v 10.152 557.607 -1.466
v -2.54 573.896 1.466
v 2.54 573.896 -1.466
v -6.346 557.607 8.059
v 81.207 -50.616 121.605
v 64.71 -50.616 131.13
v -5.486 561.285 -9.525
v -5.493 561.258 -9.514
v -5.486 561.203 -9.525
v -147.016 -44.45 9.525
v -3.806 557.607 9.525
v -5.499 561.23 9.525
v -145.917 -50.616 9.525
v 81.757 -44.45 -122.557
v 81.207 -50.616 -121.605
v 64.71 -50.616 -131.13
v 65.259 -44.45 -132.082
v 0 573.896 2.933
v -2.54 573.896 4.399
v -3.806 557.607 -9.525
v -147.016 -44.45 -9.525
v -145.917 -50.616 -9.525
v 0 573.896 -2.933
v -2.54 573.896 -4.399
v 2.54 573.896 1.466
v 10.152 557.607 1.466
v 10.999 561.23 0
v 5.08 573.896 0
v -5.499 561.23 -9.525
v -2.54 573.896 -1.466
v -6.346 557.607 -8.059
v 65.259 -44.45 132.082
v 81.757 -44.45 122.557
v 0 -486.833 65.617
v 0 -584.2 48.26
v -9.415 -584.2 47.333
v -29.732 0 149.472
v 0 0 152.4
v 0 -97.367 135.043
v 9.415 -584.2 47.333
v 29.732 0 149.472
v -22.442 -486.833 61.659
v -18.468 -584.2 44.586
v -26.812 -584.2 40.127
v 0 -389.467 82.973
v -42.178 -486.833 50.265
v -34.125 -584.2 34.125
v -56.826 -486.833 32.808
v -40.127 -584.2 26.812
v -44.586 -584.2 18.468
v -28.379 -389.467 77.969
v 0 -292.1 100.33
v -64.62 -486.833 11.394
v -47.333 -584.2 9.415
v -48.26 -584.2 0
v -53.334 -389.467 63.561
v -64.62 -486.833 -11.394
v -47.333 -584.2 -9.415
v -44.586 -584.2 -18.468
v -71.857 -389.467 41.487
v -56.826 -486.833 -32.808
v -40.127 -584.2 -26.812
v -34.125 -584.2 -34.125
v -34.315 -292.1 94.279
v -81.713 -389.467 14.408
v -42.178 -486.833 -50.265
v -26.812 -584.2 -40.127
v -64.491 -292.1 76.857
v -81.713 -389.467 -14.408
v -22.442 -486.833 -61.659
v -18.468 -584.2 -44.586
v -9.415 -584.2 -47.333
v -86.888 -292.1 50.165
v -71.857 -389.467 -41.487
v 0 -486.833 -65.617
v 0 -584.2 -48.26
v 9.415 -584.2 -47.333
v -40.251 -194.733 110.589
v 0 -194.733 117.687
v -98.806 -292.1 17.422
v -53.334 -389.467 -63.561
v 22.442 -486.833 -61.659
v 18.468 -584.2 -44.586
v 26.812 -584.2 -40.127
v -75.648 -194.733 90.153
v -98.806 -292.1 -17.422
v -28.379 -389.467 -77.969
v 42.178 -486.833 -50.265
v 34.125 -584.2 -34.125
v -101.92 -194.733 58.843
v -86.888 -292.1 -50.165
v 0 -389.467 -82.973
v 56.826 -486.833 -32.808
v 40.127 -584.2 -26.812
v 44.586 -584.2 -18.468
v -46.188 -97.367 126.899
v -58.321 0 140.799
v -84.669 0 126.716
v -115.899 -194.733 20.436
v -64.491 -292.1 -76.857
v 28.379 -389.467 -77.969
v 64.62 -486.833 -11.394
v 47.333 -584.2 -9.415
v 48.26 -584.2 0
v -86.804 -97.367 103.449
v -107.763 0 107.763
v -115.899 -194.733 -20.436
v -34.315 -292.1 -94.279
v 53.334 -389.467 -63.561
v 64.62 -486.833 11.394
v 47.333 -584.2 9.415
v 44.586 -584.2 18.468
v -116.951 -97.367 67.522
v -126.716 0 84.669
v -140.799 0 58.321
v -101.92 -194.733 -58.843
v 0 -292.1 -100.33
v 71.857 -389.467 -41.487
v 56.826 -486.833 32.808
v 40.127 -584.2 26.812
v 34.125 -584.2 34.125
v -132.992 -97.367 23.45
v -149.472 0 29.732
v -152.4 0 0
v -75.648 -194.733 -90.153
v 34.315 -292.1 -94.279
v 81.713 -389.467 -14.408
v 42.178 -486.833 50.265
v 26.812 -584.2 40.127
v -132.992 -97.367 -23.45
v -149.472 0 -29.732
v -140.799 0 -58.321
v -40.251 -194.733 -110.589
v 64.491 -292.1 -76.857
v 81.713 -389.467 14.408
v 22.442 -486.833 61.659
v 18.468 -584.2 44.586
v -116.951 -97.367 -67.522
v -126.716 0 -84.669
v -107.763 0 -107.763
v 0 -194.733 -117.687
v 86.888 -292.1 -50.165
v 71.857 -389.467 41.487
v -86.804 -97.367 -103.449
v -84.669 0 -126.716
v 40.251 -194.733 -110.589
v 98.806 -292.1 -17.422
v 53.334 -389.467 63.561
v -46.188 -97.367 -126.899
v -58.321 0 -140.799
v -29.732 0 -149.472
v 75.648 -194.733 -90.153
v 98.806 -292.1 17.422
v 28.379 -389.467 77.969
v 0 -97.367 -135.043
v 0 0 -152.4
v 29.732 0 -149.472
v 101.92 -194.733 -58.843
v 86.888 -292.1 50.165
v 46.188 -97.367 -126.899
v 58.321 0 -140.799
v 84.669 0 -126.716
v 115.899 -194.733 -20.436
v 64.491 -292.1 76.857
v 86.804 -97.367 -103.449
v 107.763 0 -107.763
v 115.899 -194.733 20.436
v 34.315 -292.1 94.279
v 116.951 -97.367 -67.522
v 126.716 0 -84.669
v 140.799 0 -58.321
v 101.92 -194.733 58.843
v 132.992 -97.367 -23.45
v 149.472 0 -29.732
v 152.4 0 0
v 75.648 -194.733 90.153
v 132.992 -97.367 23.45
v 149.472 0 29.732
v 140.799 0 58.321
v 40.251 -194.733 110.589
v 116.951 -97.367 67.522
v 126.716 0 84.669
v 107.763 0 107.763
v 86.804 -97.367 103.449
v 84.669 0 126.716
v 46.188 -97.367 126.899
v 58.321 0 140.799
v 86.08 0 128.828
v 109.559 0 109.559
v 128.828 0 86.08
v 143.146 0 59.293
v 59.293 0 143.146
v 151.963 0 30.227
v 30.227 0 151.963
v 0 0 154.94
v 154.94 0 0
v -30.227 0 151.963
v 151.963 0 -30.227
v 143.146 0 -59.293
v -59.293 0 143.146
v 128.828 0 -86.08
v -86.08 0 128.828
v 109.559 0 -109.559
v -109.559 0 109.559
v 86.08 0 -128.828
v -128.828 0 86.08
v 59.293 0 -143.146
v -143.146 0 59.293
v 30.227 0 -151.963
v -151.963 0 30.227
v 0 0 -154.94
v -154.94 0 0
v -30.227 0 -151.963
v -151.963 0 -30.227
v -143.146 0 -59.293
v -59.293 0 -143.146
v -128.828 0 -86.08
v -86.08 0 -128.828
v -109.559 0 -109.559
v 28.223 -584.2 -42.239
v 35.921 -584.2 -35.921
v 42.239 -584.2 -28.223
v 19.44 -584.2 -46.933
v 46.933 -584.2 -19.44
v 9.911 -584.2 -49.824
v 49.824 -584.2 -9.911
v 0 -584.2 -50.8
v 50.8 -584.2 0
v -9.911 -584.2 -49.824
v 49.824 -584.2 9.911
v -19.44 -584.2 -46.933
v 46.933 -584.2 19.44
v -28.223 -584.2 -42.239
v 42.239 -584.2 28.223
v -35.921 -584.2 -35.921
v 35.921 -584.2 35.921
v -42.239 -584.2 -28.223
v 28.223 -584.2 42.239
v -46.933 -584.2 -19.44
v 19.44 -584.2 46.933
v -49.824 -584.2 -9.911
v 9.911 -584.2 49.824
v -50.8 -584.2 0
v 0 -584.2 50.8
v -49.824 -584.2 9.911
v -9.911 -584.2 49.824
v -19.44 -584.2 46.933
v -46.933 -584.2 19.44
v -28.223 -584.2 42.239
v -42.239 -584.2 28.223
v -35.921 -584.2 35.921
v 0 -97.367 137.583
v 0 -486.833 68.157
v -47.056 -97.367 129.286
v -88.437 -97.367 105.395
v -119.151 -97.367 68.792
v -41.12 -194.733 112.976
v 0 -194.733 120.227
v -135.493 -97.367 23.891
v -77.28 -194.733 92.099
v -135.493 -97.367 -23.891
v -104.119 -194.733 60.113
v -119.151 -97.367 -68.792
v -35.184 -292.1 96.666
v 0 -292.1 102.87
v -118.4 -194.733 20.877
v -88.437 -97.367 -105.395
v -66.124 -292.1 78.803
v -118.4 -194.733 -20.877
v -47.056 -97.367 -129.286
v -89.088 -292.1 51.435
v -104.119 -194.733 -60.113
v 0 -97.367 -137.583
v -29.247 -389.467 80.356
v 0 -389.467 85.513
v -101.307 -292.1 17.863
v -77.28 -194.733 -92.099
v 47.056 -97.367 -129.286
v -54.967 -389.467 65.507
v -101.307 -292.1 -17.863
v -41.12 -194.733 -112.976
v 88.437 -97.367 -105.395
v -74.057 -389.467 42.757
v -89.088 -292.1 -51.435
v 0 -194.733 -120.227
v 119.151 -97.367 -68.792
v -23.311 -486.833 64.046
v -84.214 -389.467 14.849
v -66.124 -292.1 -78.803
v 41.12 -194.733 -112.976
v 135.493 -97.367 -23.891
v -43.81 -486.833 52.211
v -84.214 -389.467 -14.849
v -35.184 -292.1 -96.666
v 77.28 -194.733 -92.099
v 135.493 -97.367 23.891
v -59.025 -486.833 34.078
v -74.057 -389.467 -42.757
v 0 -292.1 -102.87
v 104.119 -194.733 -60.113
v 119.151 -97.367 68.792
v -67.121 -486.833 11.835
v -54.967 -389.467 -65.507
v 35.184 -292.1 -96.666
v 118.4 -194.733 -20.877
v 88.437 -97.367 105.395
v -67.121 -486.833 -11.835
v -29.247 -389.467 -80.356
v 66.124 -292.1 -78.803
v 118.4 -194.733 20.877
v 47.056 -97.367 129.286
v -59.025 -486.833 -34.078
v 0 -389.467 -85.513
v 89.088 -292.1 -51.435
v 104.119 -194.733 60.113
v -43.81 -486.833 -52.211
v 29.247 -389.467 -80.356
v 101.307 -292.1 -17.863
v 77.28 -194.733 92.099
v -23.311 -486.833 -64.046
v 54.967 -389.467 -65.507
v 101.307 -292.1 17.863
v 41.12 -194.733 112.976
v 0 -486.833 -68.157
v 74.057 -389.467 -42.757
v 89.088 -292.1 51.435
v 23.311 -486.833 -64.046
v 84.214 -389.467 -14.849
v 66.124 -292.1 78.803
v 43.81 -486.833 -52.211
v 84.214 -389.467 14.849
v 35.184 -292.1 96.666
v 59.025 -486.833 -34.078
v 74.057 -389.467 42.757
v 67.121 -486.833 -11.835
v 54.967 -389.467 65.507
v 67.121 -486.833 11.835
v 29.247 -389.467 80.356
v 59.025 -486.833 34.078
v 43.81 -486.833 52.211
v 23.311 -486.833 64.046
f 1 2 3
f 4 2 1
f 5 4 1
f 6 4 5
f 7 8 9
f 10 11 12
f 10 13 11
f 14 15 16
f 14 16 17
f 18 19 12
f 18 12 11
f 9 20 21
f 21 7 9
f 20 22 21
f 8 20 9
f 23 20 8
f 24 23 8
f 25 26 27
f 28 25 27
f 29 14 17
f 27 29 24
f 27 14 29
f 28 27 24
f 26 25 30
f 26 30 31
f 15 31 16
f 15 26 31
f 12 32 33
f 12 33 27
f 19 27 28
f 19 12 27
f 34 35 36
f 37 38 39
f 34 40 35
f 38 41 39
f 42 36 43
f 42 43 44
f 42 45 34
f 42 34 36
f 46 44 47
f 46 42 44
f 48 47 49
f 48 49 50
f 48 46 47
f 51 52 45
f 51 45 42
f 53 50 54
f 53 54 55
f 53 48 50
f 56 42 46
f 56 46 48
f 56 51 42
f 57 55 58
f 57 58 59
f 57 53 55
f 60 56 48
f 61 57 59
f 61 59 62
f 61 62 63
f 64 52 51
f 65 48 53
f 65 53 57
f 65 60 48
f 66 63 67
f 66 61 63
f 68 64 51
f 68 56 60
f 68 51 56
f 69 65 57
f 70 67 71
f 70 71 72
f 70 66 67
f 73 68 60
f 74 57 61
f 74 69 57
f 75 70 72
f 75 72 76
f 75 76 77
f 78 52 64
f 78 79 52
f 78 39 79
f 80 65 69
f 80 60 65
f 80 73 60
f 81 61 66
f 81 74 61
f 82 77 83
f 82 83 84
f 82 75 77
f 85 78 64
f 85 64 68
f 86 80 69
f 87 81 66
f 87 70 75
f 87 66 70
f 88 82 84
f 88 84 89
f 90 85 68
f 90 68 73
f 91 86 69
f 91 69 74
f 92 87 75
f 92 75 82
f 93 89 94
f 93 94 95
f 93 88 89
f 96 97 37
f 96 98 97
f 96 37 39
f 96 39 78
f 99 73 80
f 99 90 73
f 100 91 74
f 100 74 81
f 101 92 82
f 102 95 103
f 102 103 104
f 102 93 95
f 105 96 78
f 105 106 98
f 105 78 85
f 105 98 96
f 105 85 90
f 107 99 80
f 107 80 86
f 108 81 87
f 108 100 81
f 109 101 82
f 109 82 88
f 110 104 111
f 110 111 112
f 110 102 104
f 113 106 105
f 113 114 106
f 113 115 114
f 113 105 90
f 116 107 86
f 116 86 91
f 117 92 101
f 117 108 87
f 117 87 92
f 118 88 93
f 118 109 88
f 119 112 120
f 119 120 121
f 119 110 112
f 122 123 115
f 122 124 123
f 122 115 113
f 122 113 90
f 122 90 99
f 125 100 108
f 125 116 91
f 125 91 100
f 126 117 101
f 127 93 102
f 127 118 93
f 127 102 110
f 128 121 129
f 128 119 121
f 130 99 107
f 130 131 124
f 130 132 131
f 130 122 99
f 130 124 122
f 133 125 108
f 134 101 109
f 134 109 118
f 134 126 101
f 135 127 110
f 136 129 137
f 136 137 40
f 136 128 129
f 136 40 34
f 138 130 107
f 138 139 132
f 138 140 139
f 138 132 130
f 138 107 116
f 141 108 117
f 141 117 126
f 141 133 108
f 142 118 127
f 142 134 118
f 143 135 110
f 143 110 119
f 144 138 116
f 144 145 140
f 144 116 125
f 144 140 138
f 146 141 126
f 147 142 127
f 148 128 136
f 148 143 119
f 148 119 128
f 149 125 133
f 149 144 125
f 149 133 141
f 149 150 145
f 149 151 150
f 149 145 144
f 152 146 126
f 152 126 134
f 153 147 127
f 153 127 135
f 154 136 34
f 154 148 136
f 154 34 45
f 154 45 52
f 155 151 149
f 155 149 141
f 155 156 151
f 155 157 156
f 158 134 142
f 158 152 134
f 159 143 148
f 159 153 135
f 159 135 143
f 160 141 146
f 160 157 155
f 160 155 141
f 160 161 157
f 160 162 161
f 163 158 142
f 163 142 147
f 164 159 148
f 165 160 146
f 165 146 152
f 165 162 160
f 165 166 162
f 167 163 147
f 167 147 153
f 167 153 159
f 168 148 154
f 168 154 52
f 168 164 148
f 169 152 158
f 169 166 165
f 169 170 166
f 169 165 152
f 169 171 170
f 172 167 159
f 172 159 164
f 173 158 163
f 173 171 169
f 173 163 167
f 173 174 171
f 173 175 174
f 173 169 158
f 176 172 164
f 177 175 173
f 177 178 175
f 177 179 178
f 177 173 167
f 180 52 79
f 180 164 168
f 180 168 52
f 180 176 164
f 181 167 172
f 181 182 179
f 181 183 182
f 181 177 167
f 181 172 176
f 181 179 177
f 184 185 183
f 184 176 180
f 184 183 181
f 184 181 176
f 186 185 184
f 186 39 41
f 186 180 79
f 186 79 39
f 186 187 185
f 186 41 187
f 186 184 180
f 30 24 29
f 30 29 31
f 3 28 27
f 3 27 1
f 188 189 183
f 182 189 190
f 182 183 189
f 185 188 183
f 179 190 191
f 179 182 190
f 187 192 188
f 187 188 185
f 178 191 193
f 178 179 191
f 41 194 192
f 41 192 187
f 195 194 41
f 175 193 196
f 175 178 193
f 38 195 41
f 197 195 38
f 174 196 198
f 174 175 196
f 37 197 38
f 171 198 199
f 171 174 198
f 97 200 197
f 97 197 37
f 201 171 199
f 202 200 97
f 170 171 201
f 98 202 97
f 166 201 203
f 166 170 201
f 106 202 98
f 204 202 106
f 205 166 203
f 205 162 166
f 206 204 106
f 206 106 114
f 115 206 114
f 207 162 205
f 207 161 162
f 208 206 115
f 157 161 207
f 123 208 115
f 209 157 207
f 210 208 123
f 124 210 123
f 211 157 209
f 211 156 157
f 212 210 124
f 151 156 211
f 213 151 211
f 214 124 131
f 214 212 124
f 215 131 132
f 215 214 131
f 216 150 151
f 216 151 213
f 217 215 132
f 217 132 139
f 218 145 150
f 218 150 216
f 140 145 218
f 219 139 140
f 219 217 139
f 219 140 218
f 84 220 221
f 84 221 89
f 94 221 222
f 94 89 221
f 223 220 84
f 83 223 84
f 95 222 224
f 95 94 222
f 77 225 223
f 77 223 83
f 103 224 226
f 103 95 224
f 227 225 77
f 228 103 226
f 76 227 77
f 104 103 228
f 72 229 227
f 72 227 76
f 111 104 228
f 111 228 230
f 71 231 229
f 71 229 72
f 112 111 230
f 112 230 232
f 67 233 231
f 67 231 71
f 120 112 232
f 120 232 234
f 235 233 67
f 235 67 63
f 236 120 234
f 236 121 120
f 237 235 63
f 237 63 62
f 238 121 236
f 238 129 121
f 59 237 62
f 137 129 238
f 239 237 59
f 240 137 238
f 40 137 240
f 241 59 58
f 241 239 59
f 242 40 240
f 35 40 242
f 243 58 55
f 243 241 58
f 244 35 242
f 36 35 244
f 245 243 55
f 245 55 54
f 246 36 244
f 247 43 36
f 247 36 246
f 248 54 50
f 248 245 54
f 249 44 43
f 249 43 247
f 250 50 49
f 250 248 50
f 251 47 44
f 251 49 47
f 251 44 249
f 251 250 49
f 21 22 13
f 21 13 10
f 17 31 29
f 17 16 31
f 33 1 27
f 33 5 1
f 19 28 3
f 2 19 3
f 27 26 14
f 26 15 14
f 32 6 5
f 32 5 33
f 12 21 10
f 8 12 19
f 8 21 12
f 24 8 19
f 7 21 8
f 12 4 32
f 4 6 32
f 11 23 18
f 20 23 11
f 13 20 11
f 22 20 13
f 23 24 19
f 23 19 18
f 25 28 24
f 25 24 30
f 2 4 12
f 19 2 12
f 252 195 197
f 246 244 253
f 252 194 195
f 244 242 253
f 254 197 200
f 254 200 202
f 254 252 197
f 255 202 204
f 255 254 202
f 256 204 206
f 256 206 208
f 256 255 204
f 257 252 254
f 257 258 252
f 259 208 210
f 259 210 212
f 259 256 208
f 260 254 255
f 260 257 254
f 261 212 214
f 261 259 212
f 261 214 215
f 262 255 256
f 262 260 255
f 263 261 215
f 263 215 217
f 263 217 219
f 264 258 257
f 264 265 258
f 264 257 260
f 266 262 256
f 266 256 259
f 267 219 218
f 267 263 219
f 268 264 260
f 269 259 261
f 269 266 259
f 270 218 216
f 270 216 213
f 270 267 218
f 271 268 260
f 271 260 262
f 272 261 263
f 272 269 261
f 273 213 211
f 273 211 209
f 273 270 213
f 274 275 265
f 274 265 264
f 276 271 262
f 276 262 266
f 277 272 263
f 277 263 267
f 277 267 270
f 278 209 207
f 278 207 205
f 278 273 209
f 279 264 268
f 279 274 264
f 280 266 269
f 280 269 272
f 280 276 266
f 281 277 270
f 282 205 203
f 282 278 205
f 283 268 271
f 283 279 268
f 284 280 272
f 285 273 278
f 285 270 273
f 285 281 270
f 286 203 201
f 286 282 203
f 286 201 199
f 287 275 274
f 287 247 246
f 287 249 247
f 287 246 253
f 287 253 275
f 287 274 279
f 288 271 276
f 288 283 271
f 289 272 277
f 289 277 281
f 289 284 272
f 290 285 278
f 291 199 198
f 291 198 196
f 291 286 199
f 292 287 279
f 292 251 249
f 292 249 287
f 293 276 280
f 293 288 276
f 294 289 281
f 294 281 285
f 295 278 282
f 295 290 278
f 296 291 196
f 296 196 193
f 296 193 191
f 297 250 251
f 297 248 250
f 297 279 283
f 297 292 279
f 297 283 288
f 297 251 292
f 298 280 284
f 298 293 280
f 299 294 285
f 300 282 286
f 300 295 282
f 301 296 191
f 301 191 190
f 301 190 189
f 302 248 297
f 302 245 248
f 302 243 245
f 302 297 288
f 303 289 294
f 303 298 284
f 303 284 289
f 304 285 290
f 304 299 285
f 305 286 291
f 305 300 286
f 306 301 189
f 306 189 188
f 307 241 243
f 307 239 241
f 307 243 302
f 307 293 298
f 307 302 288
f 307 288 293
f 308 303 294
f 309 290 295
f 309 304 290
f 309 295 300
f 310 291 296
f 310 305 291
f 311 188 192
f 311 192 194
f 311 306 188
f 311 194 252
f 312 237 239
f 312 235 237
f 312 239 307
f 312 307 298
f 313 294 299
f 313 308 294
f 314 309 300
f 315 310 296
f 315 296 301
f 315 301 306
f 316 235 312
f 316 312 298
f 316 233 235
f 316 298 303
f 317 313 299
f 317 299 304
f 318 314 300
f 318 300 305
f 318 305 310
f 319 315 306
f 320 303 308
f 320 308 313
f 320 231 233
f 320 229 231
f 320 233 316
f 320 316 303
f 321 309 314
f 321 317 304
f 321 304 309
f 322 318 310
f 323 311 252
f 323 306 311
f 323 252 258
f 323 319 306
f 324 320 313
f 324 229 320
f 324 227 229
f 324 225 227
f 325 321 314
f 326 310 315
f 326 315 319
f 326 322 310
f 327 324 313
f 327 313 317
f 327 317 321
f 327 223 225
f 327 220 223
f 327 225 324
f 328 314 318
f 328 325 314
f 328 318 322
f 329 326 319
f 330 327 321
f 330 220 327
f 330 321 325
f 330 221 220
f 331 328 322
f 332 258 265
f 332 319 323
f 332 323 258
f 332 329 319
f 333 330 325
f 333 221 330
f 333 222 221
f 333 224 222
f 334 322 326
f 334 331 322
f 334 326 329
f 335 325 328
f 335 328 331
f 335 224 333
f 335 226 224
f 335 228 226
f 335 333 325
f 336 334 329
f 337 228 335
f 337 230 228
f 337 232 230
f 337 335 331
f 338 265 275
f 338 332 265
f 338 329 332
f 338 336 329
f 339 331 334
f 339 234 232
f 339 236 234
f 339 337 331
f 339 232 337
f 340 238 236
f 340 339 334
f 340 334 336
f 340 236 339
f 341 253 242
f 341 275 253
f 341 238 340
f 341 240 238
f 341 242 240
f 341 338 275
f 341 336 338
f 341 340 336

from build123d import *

# Parameters (mm, degrees)
BOSS_EXTRUDE1_DEPTH      = 9.525
BOSS_EXTRUDE1_DEPTH_BACK = 9.525
CIRPATTERN2_COUNT        = 3
CUT_EXTRUDE2_DEPTH       = 9.525
CUT_EXTRUDE3_DEPTH       = 9.525
SKETCH5_W                = 19.16873437
SKETCH5_H                = 21.353350775
CUT_EXTRUDE4_DEPTH       = 9.525


with BuildPart() as part:
    # Sketch1 → Revolve1 (revolve)
    with BuildSketch(Plane.XY):
        Polygon((-152.4, 0), (-154.94, 0), (-50.8, -584.2), (-48.26, -584.2), align=None)
    revolve(axis=Axis((0, 0, 0), (0, -1, 0)))


with BuildPart() as body_2:
    # Sketch2 → Boss-Extrude1 (new, two sides: drawn at the far end of the back side and taken through both)
    with BuildSketch(Plane.XY.offset(-BOSS_EXTRUDE1_DEPTH_BACK)):
        Polygon((-147.016304348, -44.45), (-2.54, 573.895855878), (0, 573.895855878), (-145.917078747, -50.616387514), align=None)
    extrude(amount=BOSS_EXTRUDE1_DEPTH + BOSS_EXTRUDE1_DEPTH_BACK)


with BuildPart() as cirpattern2_1:
    # CirPattern2: pattern copy
    add(body_2.part.rotate(Axis((0, 0, 0), (0, 1, 0)), 1 * 360 / CIRPATTERN2_COUNT))


with BuildPart() as cirpattern2_2:
    # CirPattern2: pattern copy
    add(body_2.part.rotate(Axis((0, 0, 0), (0, 1, 0)), 2 * 360 / CIRPATTERN2_COUNT))


with BuildPart() as cut_extrude2_tool:
    # Sketch3 → Cut-Extrude2 (new body)
    with BuildSketch(Plane(origin=(64.778869389, 30.271122739, -112.200293038), x_dir=(-0.8734652456991303, 0.1268250384797258, -0.4700785829735003), z_dir=(0.4868865006916478, 0.22752173913043477, -0.8433121567173715))):
        Polygon((63.265227426, 554.751830163), (60.577854189, 534.293710414), (79.454635817, 531.814061338), (82.142009054, 552.272181087), align=None)
    extrude(amount=CUT_EXTRUDE2_DEPTH)


with BuildPart() as body_2_1:
    add(body_2.part)

    # Cut-Extrude2: cut by cut_extrude2_tool
    add(cut_extrude2_tool.part, mode=Mode.SUBTRACT)


with BuildPart() as cirpattern2_1_1:
    add(cirpattern2_1.part)

    # Cut-Extrude2: cut by cut_extrude2_tool
    add(cut_extrude2_tool.part, mode=Mode.SUBTRACT)


with BuildPart() as cut_extrude3_tool:
    # Sketch4 → Cut-Extrude3 (new body)
    with BuildSketch(Plane(origin=(64.778869389, 30.271122739, 112.200293038), x_dir=(0.8734652456991238, -0.12682503847972984, -0.4700785829735115), z_dir=(0.4868865006916596, 0.22752173913043477, 0.8433121567173646))):
        Polygon((-82.152966833, 552.270741676), (-79.695461902, 533.5625364), (-60.708482562, 536.056661019), (-63.165987493, 554.764866294), align=None)
    extrude(amount=CUT_EXTRUDE3_DEPTH)


with BuildPart() as body_2_2:
    add(body_2_1.part)

    # Cut-Extrude3: cut by cut_extrude3_tool
    add(cut_extrude3_tool.part, mode=Mode.SUBTRACT)


with BuildPart() as cirpattern2_2_1:
    add(cirpattern2_2.part)

    # Cut-Extrude3: cut by cut_extrude3_tool
    add(cut_extrude3_tool.part, mode=Mode.SUBTRACT)


with BuildPart() as cut_extrude4_tool:
    # Sketch5 → Cut-Extrude4 (new body)
    with BuildSketch(Plane(origin=(-129.557738777, 30.271122739, 0), x_dir=(0, 0, 1), z_dir=(-0.9737730013833114, 0.2275217391304348, 0))):
        with Locations((0.059367185, 549.115957065)):
            Rectangle(SKETCH5_W, SKETCH5_H)
    extrude(amount=CUT_EXTRUDE4_DEPTH)


with BuildPart() as cirpattern2_1_2:
    add(cirpattern2_1_1.part)

    # Cut-Extrude4: cut by cut_extrude4_tool
    add(cut_extrude4_tool.part, mode=Mode.SUBTRACT)


with BuildPart() as cirpattern2_2_2:
    add(cirpattern2_2_1.part)

    # Cut-Extrude4: cut by cut_extrude4_tool
    add(cut_extrude4_tool.part, mode=Mode.SUBTRACT)


solid = Compound([part.part, body_2_2.part, cirpattern2_1_2.part, cirpattern2_2_2.part])
